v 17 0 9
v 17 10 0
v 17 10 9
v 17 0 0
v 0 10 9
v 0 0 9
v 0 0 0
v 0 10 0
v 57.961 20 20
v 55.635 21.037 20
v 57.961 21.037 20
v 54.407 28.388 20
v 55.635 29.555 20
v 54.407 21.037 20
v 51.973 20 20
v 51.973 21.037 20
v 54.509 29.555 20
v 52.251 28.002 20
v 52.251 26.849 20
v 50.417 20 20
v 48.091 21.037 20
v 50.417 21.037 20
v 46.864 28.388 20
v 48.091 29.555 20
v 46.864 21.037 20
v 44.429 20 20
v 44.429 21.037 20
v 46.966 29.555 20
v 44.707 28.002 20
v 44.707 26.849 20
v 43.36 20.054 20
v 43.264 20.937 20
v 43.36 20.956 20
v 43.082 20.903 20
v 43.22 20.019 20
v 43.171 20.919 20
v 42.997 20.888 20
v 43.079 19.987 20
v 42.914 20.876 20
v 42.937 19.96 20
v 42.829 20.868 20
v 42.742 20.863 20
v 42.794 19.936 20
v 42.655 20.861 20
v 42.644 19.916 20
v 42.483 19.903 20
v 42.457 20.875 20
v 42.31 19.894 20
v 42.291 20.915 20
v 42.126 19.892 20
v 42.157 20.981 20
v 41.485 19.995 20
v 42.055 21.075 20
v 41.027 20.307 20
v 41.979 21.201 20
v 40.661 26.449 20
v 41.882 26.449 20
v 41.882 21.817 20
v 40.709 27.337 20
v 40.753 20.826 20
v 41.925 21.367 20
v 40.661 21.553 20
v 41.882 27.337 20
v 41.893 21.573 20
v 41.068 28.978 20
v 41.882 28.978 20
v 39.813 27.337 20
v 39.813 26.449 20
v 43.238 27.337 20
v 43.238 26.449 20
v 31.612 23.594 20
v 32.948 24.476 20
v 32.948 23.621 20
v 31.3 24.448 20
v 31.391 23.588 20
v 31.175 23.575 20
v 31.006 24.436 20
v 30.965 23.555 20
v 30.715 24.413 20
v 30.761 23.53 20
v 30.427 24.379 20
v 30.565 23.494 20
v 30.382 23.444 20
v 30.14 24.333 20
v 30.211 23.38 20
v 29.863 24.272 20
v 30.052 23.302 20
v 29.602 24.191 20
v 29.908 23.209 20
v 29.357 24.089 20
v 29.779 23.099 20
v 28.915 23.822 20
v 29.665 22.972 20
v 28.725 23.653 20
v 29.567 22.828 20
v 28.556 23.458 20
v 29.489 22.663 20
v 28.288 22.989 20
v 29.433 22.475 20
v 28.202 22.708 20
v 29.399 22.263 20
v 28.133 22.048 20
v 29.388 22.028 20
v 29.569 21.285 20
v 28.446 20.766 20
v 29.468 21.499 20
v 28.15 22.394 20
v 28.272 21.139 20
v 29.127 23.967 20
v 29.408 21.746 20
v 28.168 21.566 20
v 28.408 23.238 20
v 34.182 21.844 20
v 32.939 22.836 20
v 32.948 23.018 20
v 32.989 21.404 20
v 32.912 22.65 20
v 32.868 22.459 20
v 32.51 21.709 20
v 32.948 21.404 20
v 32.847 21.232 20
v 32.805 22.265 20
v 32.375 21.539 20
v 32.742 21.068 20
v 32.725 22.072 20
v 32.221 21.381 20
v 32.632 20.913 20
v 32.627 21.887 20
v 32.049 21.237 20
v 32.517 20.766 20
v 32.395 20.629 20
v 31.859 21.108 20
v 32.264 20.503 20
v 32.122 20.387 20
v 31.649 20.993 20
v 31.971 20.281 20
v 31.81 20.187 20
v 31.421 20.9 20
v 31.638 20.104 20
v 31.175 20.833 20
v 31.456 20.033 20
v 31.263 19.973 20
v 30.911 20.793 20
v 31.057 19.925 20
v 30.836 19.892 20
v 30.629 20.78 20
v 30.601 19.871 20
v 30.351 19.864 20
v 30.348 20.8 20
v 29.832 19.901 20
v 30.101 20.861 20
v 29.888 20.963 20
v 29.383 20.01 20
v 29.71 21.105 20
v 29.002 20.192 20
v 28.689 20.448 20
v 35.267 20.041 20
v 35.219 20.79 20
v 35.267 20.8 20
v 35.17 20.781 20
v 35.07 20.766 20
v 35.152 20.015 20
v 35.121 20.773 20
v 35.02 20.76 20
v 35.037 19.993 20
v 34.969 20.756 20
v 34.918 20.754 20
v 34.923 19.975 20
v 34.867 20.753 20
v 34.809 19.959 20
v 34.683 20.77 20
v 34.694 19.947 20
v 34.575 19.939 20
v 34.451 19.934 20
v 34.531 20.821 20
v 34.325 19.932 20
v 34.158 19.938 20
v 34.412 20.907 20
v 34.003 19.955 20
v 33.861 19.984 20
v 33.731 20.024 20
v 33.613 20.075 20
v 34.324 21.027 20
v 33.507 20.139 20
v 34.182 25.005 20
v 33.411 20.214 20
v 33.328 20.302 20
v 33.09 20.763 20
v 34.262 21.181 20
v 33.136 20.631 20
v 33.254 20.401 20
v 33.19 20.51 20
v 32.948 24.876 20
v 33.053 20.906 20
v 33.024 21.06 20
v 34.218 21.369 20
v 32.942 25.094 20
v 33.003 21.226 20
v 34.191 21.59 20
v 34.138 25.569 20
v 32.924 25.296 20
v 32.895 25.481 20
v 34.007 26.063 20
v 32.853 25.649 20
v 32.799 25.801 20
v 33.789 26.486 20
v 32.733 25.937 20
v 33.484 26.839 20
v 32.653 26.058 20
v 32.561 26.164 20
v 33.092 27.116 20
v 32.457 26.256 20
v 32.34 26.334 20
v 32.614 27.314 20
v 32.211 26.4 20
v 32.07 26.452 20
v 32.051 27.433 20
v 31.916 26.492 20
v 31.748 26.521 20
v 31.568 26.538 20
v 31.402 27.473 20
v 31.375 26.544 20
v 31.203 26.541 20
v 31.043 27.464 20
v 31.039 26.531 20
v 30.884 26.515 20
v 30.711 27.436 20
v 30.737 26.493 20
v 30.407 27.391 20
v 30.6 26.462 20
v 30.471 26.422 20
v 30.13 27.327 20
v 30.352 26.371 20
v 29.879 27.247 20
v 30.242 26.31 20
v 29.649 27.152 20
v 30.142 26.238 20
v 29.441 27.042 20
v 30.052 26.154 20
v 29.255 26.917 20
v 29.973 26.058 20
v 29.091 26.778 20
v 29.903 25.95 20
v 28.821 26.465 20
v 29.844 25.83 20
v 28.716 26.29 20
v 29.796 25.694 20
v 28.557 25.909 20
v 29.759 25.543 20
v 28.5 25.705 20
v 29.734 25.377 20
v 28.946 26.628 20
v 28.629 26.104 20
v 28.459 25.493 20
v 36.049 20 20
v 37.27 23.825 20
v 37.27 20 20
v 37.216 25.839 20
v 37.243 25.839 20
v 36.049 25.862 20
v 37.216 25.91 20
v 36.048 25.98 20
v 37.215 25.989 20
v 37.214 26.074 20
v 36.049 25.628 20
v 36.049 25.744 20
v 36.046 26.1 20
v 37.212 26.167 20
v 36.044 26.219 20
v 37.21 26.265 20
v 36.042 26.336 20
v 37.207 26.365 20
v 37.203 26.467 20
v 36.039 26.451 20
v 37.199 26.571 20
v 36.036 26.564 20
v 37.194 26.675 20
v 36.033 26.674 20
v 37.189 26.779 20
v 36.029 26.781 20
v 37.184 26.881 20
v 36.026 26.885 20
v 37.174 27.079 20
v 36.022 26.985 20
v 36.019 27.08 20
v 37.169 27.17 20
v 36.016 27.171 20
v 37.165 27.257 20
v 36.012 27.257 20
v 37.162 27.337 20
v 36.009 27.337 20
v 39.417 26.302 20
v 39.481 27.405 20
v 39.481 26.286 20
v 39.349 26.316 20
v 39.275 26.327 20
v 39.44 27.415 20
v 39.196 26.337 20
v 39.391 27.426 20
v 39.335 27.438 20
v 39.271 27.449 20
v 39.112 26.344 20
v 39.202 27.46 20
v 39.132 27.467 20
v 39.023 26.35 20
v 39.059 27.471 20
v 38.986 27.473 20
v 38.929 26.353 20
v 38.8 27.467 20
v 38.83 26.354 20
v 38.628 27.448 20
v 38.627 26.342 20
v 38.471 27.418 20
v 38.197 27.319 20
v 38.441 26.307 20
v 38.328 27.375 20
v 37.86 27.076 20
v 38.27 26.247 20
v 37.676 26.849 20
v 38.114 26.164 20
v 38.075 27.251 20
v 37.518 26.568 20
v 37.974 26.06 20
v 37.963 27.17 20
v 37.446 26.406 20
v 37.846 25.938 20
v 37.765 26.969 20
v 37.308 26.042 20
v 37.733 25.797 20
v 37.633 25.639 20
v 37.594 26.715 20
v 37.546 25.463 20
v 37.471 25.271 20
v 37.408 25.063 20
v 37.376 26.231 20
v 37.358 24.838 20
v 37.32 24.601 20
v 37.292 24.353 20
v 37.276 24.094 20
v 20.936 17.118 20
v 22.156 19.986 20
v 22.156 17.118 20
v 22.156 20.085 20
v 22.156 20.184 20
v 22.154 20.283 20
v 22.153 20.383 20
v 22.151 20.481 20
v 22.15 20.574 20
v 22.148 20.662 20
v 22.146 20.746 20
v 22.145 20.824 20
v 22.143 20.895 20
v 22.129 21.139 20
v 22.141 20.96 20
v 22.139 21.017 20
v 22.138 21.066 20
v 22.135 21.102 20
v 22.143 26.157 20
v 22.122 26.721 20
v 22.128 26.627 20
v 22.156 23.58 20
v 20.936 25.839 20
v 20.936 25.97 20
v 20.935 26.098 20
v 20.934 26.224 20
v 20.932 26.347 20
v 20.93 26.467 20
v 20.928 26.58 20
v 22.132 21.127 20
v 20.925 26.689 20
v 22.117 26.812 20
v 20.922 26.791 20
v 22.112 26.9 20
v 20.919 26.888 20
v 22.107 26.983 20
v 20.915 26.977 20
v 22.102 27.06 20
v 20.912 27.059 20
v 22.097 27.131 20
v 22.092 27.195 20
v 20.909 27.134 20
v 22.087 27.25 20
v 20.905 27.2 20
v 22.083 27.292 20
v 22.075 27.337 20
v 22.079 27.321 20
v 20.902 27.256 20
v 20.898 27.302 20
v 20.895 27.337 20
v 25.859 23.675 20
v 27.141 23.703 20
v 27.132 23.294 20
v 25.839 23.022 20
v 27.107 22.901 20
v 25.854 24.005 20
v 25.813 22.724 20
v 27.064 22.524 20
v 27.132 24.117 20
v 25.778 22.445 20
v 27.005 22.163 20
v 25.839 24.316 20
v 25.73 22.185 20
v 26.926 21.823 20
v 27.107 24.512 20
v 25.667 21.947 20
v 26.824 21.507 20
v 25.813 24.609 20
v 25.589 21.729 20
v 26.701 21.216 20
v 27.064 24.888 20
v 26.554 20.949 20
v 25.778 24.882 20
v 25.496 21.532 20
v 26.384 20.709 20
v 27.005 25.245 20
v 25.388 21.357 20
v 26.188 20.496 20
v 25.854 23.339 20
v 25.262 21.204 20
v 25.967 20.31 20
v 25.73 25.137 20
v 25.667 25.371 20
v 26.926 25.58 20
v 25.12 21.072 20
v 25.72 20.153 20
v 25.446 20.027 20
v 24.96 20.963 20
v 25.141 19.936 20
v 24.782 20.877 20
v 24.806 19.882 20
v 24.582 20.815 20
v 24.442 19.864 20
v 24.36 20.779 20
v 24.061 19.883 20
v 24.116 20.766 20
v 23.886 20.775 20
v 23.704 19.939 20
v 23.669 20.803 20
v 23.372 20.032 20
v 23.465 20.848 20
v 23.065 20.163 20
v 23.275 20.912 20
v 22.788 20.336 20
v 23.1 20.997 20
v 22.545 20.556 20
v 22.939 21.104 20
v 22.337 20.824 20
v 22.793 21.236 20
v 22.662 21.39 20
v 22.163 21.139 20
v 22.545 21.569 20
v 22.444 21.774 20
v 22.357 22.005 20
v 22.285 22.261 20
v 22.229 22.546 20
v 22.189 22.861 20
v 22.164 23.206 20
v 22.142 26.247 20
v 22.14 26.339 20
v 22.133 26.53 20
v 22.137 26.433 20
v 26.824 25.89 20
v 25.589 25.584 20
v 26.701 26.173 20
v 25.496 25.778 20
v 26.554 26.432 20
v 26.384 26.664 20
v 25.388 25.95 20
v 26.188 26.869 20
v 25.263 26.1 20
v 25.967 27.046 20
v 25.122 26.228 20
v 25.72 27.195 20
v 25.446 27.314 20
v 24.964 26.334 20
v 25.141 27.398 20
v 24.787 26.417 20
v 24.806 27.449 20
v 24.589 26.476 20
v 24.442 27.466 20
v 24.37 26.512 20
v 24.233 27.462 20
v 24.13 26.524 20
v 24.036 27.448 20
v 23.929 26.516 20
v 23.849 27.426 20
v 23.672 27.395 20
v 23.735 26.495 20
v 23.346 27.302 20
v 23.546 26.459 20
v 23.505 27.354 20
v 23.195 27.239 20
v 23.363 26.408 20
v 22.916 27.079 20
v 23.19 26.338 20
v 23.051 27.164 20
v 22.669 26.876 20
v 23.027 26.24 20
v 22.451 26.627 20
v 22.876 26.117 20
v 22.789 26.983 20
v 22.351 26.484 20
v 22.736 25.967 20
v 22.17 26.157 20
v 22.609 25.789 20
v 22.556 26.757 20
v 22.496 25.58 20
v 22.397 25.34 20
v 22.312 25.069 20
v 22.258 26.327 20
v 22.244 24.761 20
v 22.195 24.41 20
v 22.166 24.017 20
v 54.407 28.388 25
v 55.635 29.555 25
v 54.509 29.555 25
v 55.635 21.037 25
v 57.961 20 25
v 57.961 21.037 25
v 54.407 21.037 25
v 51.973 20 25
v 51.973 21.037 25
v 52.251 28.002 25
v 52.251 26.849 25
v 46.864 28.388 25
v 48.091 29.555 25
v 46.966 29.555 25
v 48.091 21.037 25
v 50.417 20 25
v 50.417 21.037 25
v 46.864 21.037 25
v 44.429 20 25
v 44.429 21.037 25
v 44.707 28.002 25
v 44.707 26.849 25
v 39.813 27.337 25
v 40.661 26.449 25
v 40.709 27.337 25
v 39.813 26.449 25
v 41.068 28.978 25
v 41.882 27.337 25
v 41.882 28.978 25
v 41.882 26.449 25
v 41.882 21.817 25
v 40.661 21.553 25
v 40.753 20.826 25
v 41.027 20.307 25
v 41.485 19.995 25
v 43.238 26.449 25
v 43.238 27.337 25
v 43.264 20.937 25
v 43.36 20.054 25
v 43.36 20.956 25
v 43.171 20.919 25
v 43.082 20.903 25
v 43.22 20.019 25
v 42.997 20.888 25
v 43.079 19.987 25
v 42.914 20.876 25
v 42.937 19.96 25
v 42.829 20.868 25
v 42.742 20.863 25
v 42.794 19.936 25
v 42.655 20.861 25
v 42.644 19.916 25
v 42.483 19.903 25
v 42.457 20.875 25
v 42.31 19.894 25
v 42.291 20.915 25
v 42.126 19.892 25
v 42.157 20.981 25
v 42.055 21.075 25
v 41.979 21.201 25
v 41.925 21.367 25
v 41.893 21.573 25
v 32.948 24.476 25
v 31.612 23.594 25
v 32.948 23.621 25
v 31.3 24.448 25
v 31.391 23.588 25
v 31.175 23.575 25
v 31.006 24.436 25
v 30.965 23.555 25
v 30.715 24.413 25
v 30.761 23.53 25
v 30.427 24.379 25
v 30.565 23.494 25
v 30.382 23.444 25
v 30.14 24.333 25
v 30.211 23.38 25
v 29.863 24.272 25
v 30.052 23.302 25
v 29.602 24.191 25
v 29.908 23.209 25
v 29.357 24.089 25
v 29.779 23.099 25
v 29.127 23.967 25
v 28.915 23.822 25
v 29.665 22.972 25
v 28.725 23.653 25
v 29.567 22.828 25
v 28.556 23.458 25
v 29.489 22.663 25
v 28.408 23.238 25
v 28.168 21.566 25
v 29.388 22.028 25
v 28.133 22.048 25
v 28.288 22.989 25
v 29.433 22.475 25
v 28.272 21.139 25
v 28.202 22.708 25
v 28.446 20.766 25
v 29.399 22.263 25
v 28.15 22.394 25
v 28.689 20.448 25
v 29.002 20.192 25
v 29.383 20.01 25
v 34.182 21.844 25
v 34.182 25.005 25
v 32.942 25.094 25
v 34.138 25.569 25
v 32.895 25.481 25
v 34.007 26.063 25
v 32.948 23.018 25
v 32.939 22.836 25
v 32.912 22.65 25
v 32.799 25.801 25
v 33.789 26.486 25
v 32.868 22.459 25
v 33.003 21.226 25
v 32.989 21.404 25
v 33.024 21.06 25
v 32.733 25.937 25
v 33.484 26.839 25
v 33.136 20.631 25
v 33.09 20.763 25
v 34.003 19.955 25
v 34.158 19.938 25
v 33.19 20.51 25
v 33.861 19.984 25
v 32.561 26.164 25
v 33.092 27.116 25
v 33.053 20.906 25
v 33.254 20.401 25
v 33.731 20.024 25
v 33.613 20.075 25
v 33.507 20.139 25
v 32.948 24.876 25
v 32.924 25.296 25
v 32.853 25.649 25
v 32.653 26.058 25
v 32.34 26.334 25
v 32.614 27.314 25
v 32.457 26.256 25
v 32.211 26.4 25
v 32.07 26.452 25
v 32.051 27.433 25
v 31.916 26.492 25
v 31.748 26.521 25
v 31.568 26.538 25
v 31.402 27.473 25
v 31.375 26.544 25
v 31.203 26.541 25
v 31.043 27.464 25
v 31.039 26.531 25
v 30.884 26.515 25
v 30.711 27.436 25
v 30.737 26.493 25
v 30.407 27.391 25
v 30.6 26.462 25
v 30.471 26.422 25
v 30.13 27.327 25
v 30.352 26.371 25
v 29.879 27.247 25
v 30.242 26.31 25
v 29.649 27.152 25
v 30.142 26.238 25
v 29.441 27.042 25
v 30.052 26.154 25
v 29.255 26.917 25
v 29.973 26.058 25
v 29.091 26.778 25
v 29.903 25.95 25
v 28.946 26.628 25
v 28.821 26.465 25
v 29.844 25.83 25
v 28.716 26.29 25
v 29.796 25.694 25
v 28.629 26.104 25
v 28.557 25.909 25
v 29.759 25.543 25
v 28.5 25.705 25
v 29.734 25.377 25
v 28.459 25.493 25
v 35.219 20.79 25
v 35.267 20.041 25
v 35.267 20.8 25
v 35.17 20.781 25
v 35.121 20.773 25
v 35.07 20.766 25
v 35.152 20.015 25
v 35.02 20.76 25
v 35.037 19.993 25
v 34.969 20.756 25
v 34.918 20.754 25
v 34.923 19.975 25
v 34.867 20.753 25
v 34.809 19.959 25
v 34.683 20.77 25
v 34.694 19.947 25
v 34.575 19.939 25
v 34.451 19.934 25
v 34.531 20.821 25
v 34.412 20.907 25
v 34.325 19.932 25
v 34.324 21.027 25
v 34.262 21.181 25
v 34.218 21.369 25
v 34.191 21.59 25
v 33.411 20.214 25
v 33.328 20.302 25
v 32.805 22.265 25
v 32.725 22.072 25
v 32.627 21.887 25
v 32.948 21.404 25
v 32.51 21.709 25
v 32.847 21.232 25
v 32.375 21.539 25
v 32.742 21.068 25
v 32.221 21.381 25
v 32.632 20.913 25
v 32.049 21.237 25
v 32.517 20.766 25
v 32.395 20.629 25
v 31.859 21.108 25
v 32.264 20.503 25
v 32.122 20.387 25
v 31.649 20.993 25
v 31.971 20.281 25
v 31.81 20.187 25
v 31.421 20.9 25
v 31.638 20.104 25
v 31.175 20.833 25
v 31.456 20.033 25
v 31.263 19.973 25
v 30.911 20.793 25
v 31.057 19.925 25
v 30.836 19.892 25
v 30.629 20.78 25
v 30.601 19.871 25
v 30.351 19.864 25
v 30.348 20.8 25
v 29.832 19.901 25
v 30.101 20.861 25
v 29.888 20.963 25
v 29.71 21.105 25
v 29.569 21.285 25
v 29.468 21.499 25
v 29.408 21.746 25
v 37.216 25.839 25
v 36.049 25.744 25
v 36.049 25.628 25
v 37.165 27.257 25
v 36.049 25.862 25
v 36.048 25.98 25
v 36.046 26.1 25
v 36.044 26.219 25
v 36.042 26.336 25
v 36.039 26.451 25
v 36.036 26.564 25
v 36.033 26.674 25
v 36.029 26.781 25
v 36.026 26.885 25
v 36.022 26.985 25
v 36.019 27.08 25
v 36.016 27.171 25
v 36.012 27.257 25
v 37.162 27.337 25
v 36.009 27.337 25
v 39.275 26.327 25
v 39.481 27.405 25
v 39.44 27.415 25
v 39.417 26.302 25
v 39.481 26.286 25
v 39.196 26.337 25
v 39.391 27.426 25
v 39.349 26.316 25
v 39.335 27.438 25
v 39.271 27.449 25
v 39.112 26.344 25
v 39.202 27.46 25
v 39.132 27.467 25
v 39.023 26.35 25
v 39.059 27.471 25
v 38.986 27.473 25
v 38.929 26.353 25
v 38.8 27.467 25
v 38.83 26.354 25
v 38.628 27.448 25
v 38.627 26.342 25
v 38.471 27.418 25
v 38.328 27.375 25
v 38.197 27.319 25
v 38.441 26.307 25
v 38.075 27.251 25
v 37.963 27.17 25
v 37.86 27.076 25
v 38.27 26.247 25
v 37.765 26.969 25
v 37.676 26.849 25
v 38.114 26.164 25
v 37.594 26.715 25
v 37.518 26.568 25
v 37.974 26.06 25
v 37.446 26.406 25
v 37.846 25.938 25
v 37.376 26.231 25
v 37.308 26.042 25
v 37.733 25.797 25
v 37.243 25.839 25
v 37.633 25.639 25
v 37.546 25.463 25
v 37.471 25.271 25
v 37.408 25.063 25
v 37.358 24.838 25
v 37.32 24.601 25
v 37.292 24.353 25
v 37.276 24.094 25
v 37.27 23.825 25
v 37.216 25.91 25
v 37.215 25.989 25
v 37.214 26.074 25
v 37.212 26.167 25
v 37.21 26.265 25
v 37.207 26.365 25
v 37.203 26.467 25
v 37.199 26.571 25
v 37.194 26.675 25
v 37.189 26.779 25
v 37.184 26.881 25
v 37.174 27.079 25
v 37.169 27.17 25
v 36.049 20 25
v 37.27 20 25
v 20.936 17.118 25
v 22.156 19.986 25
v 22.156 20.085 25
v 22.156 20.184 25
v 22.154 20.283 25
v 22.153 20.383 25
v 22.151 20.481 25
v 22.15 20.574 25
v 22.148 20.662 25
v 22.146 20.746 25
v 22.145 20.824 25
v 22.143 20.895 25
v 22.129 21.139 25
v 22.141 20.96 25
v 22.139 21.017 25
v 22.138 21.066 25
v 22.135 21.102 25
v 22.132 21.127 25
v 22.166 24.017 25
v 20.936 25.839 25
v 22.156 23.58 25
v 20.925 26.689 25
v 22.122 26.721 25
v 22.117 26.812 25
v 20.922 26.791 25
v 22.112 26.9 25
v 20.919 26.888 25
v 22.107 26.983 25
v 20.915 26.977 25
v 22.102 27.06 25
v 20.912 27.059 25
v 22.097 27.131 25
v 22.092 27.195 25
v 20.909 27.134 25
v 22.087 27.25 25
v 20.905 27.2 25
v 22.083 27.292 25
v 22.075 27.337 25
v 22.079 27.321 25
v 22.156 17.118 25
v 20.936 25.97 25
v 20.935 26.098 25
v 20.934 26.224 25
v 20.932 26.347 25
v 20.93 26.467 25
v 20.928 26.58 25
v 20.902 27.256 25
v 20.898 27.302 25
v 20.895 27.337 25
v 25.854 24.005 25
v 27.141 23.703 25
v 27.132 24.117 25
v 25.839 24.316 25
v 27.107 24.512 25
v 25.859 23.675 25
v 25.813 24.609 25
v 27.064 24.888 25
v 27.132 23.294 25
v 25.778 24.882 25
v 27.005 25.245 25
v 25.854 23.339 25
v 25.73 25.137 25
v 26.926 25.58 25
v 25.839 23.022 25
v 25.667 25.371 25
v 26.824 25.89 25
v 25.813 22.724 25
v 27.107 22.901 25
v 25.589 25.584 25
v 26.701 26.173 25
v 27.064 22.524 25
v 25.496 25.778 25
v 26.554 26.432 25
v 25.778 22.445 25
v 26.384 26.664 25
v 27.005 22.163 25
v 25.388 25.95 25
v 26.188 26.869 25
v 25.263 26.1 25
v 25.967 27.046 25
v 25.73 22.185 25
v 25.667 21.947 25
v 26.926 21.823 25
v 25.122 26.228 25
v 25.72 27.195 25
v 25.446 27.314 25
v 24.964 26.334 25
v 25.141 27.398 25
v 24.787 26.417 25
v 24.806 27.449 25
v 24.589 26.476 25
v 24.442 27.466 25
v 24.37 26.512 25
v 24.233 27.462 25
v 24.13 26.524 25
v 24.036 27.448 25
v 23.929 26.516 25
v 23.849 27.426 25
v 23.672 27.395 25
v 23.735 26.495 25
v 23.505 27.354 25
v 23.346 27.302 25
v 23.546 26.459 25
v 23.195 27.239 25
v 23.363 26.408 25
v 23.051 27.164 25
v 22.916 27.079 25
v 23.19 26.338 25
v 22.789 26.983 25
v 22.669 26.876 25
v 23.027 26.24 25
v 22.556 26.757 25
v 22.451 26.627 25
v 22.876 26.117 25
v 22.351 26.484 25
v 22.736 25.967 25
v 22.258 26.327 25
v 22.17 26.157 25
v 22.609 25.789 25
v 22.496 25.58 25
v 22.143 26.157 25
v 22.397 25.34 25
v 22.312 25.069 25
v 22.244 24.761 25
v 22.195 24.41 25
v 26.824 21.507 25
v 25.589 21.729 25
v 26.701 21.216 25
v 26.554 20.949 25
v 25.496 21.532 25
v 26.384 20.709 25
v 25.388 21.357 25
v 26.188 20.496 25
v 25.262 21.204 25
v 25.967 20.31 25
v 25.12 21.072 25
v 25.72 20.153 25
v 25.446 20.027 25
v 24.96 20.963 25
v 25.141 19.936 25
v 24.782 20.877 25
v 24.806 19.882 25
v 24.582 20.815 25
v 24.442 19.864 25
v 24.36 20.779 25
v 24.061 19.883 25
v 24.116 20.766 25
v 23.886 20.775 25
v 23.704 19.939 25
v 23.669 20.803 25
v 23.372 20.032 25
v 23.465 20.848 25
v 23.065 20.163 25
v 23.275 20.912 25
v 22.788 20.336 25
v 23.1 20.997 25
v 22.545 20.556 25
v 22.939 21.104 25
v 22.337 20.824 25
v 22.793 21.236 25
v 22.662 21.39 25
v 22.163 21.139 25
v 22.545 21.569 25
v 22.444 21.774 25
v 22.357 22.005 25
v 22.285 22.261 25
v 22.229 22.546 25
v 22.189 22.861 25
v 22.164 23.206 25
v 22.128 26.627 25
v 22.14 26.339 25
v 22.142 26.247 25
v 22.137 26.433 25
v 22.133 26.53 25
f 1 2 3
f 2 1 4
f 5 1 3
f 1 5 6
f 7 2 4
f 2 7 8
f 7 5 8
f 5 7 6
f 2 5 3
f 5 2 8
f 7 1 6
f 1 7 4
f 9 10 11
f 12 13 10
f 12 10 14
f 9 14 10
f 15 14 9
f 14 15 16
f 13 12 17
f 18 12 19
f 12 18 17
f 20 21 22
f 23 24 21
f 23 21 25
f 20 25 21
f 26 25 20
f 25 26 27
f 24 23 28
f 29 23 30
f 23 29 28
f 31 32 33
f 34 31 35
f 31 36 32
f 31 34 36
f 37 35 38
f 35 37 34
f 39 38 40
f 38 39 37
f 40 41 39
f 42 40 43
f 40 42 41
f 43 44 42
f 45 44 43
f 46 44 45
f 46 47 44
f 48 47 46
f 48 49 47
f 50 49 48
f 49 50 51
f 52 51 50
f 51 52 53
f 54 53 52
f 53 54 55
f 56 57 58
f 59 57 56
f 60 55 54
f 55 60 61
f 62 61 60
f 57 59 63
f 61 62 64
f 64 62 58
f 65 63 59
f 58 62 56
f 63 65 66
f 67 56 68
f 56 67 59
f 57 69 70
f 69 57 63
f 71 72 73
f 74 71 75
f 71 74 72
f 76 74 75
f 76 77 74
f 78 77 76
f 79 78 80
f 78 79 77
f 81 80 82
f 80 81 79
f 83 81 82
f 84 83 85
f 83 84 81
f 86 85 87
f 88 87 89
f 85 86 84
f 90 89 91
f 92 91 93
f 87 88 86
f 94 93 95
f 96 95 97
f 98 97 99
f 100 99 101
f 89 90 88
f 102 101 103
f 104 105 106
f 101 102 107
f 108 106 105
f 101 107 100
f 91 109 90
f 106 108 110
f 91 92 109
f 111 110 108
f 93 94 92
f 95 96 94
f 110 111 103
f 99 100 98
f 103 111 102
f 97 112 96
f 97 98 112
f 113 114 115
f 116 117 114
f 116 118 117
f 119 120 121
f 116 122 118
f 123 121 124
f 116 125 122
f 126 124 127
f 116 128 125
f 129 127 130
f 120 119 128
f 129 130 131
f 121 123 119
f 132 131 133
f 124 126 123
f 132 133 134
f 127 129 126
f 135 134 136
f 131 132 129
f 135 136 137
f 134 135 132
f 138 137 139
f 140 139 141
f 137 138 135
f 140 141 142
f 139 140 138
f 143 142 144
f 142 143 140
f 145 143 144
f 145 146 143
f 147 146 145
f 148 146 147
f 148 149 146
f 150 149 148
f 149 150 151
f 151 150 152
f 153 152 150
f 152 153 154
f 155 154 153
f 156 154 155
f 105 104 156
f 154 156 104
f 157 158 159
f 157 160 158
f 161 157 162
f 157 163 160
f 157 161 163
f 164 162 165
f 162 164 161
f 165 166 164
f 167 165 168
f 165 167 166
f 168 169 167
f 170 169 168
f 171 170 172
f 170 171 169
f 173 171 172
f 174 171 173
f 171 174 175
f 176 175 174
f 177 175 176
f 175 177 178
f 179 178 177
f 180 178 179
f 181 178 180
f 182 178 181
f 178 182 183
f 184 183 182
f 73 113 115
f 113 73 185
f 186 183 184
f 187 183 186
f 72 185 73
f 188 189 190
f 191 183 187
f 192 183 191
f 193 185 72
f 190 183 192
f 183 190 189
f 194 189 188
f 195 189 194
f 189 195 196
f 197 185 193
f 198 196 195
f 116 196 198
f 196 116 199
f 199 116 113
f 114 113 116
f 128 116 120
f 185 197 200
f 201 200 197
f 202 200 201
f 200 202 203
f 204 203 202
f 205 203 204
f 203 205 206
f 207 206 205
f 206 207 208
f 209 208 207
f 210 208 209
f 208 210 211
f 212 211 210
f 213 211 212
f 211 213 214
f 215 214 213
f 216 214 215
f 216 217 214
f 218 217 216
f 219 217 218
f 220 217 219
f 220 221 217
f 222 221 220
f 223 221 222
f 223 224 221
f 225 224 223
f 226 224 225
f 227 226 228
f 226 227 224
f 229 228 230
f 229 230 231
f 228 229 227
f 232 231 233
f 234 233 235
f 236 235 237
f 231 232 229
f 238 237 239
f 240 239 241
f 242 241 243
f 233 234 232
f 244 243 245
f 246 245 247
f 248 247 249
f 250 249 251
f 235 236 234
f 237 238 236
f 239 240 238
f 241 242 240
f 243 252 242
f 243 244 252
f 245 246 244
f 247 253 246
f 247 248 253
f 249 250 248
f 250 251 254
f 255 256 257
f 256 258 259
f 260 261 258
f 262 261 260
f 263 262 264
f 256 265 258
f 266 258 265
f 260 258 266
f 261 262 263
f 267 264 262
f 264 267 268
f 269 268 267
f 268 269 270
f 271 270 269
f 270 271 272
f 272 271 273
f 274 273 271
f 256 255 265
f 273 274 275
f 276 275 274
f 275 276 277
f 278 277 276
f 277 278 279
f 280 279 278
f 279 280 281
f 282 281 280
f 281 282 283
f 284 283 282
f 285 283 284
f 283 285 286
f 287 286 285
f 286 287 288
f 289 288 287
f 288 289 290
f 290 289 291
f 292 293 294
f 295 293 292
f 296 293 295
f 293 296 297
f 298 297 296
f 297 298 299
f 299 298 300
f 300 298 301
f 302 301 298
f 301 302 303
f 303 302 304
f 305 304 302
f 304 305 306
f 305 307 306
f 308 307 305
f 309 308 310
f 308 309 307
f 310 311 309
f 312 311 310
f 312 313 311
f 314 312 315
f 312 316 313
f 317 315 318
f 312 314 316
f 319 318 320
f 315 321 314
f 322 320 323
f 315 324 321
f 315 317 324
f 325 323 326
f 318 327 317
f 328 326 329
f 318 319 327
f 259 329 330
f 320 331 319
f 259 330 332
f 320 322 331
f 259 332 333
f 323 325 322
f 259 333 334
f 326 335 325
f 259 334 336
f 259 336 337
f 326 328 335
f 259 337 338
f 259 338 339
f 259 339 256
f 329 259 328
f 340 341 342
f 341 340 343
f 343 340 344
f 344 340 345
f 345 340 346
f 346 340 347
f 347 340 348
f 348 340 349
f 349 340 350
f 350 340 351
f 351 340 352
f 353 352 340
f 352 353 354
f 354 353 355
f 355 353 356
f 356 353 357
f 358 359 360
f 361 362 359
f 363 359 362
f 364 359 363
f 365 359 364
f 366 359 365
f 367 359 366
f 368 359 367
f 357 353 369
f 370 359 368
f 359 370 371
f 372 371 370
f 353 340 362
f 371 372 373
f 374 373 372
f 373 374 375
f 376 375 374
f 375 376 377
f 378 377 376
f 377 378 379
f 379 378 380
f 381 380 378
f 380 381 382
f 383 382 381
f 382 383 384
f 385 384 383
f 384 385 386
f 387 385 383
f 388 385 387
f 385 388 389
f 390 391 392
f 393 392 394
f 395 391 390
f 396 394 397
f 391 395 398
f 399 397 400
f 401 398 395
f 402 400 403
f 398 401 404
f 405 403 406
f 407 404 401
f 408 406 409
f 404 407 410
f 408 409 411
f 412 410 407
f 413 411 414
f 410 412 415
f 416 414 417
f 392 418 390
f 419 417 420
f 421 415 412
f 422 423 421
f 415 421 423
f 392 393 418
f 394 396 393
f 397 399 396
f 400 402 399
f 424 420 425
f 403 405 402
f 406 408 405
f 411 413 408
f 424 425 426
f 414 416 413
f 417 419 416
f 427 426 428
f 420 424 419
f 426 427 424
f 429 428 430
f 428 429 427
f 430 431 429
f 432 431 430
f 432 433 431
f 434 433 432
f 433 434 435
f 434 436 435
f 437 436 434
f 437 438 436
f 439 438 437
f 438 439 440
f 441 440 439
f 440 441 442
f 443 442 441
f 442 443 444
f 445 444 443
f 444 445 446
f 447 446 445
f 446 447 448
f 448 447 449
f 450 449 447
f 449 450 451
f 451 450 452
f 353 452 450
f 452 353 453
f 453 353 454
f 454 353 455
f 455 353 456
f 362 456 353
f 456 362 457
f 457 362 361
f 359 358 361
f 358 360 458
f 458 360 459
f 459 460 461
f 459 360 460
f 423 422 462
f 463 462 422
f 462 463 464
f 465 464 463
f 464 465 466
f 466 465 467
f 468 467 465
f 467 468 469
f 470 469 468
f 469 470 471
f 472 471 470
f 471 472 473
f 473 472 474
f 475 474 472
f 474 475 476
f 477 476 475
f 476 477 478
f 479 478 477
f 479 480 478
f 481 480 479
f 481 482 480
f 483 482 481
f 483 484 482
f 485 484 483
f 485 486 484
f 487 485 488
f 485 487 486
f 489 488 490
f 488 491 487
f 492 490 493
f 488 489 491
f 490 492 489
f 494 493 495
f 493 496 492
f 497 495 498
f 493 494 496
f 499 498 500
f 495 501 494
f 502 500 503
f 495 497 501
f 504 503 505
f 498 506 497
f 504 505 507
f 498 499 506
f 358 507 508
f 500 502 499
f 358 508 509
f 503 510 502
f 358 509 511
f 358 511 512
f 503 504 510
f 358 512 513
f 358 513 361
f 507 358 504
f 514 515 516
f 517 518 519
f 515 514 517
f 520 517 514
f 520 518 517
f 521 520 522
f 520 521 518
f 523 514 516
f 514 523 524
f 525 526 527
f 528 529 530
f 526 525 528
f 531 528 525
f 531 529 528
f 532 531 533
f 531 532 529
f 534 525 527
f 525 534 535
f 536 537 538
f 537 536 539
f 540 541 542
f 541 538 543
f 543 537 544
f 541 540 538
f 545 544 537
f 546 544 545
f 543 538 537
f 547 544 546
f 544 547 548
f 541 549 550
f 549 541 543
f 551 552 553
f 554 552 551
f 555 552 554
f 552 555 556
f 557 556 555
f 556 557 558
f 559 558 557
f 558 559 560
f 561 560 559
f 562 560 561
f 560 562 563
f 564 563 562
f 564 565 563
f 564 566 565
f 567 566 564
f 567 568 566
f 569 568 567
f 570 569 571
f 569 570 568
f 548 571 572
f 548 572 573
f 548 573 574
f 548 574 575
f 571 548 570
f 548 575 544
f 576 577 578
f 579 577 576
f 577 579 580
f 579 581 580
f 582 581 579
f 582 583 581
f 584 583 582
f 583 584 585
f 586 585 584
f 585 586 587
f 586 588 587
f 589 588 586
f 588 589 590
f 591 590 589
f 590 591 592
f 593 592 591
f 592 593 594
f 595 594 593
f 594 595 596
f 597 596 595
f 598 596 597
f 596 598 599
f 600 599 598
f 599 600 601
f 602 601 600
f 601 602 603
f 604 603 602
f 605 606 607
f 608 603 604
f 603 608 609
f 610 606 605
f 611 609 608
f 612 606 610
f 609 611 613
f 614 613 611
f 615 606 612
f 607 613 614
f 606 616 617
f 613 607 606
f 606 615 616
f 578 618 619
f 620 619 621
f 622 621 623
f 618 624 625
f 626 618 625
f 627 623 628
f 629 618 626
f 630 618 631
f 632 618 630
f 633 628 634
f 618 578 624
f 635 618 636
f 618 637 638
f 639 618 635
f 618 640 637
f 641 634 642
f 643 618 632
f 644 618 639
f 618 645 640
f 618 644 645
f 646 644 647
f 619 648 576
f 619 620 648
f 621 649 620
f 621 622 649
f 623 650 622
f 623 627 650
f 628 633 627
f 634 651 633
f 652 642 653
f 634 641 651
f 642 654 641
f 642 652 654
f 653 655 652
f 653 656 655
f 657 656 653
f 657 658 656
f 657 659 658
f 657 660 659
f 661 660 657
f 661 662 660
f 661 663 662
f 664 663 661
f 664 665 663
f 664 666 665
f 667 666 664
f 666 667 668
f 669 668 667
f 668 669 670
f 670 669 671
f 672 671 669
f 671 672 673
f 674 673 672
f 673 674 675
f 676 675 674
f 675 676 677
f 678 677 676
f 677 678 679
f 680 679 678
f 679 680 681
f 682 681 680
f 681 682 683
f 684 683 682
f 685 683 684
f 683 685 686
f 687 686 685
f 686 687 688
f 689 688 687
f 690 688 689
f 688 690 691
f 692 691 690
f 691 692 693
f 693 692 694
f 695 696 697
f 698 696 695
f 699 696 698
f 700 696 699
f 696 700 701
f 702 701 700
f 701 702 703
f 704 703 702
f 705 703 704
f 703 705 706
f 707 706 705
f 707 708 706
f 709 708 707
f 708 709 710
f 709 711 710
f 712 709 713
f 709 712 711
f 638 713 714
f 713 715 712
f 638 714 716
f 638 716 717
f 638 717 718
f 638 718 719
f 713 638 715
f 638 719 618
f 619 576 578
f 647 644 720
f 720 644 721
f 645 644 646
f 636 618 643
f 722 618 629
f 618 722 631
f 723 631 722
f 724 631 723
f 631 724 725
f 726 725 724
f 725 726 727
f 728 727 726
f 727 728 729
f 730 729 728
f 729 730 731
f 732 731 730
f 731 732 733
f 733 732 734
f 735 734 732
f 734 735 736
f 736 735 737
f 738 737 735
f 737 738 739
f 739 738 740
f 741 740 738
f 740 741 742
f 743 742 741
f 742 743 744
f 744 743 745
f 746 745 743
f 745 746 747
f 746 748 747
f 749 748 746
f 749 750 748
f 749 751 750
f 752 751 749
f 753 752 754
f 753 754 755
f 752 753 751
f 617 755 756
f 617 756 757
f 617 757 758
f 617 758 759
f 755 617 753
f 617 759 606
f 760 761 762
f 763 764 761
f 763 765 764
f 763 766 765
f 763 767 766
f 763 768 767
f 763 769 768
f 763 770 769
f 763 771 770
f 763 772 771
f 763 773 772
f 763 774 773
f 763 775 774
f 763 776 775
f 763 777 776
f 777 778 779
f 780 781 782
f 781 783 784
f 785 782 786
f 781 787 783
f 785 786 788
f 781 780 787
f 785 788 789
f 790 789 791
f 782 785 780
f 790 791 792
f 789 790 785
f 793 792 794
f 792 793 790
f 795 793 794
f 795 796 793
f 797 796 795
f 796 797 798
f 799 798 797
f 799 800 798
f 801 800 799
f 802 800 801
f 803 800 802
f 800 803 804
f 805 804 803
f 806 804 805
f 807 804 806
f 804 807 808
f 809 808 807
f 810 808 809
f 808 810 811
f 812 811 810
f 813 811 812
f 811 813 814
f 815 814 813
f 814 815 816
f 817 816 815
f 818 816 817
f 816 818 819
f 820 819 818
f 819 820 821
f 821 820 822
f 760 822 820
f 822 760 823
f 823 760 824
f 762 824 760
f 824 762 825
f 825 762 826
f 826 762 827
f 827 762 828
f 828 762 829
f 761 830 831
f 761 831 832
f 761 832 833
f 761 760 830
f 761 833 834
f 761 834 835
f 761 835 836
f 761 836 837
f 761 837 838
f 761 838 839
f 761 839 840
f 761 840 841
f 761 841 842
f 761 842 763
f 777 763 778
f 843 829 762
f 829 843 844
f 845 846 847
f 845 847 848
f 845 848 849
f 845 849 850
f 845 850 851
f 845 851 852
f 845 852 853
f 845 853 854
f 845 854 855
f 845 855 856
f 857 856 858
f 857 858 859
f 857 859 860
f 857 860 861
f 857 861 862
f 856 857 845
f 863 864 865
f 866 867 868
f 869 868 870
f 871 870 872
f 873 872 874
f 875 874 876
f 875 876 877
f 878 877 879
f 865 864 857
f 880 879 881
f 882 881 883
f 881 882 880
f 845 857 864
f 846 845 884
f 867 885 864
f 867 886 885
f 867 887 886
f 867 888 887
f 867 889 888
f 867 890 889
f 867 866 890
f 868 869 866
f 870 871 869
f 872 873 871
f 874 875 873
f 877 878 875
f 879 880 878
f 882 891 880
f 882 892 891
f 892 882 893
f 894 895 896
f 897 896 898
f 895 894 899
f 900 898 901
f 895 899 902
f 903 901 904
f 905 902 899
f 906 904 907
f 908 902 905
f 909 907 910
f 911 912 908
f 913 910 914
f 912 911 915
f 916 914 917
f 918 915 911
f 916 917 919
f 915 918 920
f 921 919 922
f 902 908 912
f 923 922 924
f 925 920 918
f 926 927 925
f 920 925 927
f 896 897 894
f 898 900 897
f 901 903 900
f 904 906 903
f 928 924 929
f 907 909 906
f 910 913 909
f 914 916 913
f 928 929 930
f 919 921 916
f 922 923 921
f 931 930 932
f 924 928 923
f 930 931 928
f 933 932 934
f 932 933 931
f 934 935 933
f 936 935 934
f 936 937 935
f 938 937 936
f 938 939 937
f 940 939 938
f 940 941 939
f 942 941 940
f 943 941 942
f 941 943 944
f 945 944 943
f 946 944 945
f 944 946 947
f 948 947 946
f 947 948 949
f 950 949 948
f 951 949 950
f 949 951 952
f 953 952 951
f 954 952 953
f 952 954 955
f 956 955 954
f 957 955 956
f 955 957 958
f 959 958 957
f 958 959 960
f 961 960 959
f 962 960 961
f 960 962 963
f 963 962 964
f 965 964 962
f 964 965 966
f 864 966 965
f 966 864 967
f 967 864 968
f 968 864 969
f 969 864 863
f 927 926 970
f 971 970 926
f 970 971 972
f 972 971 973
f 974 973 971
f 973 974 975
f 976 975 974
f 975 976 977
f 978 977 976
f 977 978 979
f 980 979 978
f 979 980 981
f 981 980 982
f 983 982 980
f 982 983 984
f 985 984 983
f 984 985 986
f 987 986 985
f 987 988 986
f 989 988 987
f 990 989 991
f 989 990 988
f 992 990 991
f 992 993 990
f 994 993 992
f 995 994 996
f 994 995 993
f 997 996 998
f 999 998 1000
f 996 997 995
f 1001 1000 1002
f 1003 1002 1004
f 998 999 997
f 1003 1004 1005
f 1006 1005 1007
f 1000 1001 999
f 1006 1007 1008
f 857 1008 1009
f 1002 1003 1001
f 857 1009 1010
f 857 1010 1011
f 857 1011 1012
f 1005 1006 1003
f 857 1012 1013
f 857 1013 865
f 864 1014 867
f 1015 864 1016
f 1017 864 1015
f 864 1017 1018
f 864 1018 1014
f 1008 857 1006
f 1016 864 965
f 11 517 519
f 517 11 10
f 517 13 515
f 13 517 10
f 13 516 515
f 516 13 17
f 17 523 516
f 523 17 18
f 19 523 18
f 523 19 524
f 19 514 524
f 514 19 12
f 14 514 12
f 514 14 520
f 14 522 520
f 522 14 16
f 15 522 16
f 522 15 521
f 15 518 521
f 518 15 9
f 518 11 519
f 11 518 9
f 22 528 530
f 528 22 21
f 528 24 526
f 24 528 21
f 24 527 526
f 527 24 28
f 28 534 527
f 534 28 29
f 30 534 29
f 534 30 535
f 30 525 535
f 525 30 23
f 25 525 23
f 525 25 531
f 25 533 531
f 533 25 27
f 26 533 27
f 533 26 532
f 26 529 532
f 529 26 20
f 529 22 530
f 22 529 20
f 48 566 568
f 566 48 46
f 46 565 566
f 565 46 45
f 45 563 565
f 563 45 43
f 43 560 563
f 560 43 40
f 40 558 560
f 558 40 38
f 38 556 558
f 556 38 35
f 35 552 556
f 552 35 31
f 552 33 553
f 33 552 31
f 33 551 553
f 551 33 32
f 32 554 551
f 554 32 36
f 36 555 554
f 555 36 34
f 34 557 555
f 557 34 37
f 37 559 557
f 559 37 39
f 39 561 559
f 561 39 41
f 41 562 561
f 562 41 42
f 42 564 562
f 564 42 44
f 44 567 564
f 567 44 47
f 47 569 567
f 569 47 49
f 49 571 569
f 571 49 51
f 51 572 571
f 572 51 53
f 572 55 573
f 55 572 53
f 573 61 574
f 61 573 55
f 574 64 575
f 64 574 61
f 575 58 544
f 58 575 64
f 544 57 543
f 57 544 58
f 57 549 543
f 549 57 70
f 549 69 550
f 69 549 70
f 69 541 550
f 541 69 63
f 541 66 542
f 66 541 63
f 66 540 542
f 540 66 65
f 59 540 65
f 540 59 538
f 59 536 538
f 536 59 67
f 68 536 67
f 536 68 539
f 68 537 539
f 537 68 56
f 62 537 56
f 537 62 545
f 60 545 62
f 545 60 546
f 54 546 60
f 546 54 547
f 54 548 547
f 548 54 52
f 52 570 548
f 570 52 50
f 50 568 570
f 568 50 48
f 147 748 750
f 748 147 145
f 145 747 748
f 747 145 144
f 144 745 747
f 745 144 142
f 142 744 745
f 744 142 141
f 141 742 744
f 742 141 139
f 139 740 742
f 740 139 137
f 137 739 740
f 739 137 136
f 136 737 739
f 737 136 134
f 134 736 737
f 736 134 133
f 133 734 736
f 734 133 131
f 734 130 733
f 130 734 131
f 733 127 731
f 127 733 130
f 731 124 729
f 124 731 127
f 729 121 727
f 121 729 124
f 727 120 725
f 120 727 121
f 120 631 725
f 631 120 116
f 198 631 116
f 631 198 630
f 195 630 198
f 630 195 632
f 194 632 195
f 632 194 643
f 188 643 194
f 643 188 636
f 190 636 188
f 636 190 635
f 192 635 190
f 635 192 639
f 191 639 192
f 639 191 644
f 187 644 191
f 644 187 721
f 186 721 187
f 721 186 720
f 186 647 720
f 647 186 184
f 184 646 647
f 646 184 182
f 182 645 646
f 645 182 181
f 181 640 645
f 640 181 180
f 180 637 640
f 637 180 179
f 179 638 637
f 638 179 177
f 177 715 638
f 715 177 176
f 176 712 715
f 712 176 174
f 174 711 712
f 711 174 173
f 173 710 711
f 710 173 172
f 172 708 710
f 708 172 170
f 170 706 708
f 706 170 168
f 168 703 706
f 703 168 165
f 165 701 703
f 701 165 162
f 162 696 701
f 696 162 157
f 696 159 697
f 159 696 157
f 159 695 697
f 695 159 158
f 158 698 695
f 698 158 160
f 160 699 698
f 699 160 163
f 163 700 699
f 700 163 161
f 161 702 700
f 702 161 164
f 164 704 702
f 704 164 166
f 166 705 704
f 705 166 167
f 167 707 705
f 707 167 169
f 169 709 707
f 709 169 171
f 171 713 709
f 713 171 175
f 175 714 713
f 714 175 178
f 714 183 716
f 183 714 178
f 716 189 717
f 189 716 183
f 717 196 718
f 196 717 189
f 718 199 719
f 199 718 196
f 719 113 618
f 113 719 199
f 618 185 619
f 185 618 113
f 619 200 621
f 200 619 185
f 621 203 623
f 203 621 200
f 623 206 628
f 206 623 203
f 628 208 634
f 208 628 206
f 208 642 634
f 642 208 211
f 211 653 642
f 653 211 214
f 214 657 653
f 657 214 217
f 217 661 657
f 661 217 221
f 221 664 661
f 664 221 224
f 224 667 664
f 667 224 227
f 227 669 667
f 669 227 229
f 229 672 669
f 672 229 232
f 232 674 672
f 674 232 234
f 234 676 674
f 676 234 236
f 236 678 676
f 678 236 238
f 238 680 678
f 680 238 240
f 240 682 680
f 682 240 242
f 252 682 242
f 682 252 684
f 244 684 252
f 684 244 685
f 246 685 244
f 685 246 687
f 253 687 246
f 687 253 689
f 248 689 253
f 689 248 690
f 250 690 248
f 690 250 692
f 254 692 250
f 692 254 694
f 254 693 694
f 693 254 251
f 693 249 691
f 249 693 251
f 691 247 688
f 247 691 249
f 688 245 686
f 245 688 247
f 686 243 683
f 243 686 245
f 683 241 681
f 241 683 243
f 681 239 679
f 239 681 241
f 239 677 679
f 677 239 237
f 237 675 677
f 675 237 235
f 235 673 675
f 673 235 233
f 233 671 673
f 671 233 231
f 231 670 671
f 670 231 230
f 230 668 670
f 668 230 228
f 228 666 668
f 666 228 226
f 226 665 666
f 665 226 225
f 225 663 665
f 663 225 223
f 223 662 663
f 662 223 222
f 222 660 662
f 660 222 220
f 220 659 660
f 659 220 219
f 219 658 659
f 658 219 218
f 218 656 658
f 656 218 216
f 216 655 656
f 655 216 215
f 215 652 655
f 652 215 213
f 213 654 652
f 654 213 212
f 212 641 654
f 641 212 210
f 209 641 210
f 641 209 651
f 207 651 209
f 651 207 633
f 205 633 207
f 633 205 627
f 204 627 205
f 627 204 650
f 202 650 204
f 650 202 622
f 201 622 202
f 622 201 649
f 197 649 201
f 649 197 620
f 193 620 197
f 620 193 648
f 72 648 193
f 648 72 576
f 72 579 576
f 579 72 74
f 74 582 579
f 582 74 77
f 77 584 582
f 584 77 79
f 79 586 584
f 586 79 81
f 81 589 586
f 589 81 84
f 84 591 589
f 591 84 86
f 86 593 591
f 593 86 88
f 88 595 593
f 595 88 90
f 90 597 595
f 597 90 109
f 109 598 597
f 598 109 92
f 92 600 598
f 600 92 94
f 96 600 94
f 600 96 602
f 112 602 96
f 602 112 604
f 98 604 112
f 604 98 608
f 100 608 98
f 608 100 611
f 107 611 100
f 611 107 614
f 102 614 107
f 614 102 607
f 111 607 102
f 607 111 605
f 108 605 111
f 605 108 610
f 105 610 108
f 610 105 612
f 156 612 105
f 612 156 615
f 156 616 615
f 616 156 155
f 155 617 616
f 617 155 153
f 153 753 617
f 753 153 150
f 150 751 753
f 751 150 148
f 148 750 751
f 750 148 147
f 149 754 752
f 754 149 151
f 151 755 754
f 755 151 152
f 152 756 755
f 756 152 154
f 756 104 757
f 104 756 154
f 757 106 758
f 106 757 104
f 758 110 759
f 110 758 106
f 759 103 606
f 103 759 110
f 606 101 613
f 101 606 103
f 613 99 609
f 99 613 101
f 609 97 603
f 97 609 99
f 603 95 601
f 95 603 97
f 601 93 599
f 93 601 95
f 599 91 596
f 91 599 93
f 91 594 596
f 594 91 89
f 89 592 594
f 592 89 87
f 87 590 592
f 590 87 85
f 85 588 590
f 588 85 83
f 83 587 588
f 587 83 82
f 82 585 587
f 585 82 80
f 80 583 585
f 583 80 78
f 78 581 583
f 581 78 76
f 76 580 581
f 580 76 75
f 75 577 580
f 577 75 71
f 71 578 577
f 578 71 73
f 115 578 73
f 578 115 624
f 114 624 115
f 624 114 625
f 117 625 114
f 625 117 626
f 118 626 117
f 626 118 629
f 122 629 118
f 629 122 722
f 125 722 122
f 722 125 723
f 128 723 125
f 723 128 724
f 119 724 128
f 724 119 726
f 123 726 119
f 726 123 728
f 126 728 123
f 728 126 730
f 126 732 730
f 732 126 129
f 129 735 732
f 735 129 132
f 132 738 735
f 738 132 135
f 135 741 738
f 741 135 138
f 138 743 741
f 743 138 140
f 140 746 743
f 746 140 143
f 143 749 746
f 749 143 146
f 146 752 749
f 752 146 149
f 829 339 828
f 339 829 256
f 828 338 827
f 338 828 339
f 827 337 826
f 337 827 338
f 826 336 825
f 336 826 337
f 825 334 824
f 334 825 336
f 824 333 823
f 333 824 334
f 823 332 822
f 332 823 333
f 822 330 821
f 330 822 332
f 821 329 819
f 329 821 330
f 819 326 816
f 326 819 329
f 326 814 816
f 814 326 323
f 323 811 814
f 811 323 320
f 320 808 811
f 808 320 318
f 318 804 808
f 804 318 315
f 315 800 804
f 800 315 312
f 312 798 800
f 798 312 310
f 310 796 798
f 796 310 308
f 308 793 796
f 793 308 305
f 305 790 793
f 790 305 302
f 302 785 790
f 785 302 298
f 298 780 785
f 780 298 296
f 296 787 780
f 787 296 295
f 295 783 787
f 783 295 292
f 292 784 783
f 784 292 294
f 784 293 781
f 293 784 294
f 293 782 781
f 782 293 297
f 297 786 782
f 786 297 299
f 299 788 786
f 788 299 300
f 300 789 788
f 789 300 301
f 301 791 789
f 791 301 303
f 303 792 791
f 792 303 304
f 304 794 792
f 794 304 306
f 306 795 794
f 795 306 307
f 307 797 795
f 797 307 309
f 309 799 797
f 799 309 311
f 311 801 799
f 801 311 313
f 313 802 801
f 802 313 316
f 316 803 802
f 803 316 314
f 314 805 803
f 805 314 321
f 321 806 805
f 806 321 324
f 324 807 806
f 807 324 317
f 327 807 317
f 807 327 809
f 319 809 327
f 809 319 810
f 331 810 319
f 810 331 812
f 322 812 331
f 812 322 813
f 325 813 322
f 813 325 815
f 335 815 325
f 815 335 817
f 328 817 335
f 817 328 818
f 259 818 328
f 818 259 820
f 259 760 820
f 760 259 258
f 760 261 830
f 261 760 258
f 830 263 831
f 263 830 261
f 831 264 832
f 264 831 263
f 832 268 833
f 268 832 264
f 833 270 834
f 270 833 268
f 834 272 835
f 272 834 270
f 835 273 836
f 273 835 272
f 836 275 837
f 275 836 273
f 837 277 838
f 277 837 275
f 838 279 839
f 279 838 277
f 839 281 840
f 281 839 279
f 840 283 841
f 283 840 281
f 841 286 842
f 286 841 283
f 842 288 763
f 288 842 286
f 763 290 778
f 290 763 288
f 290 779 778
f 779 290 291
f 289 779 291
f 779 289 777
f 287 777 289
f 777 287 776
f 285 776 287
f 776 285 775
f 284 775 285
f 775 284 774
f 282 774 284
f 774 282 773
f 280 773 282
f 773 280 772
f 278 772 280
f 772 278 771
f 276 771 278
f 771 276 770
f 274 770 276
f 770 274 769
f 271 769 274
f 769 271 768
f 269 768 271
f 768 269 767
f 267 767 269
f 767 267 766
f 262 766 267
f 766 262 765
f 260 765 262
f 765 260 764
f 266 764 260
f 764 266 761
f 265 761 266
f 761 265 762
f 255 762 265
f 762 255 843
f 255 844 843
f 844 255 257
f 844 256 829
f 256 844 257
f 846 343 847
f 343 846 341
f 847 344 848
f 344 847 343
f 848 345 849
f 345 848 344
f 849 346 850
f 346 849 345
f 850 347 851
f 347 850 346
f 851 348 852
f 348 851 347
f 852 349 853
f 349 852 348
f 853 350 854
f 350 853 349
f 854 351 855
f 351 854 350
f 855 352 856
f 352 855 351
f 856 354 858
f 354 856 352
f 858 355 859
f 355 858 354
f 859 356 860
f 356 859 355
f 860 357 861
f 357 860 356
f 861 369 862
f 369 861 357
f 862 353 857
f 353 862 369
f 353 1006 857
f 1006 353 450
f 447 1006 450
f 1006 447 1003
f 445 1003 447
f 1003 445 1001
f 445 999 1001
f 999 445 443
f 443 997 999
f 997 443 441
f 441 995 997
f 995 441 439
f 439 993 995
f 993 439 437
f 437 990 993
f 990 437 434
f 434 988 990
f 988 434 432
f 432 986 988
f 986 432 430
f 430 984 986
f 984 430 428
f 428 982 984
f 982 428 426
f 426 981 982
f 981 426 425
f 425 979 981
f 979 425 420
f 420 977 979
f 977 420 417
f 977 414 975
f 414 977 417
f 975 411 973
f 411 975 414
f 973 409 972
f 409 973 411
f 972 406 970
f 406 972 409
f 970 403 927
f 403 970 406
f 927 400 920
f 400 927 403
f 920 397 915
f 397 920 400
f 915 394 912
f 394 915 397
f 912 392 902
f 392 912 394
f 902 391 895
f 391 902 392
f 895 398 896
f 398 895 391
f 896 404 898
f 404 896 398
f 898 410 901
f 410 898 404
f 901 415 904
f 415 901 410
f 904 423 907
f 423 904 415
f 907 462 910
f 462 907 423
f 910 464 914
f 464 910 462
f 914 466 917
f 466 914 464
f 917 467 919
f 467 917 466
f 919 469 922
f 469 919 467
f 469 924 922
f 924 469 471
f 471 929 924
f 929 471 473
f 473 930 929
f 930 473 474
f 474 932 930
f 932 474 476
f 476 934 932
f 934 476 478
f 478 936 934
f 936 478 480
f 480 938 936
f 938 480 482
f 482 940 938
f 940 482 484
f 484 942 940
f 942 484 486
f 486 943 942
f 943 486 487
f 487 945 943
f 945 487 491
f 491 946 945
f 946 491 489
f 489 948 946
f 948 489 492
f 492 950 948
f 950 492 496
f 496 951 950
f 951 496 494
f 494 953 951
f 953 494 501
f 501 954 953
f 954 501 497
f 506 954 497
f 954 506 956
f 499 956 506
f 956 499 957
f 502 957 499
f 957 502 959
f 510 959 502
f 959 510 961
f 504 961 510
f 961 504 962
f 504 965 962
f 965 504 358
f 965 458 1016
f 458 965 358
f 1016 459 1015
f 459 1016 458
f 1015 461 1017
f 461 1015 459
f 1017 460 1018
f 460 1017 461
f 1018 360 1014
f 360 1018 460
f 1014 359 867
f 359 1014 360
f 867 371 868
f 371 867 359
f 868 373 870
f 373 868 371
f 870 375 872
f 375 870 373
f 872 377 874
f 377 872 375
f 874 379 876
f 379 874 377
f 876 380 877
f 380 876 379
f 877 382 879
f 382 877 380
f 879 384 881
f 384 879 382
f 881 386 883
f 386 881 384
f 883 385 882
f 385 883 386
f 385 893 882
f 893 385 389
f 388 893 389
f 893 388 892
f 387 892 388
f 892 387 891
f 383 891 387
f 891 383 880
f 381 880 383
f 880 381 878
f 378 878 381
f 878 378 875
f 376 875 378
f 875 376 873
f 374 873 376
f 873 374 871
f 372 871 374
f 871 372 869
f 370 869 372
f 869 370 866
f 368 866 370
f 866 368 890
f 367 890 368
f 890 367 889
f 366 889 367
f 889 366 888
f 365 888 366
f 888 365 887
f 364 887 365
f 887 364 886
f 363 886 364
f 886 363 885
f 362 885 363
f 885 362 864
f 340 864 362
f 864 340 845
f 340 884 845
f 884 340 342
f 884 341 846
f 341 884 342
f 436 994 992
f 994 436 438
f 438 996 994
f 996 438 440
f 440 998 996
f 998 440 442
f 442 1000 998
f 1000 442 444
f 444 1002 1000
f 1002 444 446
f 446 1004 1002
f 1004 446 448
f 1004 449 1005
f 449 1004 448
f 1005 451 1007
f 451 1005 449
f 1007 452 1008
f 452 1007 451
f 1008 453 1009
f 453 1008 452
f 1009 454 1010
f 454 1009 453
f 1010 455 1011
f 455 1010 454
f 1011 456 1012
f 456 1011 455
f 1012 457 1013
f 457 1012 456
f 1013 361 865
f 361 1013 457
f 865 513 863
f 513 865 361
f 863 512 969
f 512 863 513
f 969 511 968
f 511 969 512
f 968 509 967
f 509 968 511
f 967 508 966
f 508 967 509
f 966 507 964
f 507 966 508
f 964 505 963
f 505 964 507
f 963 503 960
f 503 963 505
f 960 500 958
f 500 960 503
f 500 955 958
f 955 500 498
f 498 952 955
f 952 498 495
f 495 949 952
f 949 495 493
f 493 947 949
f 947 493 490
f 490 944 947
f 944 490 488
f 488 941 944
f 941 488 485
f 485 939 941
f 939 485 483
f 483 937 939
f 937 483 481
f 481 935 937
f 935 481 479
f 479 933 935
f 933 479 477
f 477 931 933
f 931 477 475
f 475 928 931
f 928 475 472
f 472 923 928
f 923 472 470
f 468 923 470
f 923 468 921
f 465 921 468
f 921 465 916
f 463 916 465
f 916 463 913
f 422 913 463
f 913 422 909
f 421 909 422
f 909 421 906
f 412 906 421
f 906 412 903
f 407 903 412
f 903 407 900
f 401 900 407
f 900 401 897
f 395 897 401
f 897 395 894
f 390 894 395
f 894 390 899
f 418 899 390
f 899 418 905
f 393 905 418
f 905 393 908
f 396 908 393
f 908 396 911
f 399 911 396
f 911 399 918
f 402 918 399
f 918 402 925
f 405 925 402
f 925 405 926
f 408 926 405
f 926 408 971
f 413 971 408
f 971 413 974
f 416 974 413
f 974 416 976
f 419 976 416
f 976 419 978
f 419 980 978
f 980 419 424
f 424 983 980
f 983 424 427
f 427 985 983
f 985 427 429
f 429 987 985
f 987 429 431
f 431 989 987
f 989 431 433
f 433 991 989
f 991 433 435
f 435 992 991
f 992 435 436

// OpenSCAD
//[CUSTOMIZATION]
// X Dimension
xdim=17;
// Y Dimension
ydim=10;
// Z Dimension
zdim=9;
// Message
txt="part11";
// I love it
boolvar=true;
module __END_CUSTOMIZATIONS () {}
cube([xdim,ydim,zdim]);
translate([20,20,20]) { linear_extrude(5) text(txt, font="Liberation Sans"); }
